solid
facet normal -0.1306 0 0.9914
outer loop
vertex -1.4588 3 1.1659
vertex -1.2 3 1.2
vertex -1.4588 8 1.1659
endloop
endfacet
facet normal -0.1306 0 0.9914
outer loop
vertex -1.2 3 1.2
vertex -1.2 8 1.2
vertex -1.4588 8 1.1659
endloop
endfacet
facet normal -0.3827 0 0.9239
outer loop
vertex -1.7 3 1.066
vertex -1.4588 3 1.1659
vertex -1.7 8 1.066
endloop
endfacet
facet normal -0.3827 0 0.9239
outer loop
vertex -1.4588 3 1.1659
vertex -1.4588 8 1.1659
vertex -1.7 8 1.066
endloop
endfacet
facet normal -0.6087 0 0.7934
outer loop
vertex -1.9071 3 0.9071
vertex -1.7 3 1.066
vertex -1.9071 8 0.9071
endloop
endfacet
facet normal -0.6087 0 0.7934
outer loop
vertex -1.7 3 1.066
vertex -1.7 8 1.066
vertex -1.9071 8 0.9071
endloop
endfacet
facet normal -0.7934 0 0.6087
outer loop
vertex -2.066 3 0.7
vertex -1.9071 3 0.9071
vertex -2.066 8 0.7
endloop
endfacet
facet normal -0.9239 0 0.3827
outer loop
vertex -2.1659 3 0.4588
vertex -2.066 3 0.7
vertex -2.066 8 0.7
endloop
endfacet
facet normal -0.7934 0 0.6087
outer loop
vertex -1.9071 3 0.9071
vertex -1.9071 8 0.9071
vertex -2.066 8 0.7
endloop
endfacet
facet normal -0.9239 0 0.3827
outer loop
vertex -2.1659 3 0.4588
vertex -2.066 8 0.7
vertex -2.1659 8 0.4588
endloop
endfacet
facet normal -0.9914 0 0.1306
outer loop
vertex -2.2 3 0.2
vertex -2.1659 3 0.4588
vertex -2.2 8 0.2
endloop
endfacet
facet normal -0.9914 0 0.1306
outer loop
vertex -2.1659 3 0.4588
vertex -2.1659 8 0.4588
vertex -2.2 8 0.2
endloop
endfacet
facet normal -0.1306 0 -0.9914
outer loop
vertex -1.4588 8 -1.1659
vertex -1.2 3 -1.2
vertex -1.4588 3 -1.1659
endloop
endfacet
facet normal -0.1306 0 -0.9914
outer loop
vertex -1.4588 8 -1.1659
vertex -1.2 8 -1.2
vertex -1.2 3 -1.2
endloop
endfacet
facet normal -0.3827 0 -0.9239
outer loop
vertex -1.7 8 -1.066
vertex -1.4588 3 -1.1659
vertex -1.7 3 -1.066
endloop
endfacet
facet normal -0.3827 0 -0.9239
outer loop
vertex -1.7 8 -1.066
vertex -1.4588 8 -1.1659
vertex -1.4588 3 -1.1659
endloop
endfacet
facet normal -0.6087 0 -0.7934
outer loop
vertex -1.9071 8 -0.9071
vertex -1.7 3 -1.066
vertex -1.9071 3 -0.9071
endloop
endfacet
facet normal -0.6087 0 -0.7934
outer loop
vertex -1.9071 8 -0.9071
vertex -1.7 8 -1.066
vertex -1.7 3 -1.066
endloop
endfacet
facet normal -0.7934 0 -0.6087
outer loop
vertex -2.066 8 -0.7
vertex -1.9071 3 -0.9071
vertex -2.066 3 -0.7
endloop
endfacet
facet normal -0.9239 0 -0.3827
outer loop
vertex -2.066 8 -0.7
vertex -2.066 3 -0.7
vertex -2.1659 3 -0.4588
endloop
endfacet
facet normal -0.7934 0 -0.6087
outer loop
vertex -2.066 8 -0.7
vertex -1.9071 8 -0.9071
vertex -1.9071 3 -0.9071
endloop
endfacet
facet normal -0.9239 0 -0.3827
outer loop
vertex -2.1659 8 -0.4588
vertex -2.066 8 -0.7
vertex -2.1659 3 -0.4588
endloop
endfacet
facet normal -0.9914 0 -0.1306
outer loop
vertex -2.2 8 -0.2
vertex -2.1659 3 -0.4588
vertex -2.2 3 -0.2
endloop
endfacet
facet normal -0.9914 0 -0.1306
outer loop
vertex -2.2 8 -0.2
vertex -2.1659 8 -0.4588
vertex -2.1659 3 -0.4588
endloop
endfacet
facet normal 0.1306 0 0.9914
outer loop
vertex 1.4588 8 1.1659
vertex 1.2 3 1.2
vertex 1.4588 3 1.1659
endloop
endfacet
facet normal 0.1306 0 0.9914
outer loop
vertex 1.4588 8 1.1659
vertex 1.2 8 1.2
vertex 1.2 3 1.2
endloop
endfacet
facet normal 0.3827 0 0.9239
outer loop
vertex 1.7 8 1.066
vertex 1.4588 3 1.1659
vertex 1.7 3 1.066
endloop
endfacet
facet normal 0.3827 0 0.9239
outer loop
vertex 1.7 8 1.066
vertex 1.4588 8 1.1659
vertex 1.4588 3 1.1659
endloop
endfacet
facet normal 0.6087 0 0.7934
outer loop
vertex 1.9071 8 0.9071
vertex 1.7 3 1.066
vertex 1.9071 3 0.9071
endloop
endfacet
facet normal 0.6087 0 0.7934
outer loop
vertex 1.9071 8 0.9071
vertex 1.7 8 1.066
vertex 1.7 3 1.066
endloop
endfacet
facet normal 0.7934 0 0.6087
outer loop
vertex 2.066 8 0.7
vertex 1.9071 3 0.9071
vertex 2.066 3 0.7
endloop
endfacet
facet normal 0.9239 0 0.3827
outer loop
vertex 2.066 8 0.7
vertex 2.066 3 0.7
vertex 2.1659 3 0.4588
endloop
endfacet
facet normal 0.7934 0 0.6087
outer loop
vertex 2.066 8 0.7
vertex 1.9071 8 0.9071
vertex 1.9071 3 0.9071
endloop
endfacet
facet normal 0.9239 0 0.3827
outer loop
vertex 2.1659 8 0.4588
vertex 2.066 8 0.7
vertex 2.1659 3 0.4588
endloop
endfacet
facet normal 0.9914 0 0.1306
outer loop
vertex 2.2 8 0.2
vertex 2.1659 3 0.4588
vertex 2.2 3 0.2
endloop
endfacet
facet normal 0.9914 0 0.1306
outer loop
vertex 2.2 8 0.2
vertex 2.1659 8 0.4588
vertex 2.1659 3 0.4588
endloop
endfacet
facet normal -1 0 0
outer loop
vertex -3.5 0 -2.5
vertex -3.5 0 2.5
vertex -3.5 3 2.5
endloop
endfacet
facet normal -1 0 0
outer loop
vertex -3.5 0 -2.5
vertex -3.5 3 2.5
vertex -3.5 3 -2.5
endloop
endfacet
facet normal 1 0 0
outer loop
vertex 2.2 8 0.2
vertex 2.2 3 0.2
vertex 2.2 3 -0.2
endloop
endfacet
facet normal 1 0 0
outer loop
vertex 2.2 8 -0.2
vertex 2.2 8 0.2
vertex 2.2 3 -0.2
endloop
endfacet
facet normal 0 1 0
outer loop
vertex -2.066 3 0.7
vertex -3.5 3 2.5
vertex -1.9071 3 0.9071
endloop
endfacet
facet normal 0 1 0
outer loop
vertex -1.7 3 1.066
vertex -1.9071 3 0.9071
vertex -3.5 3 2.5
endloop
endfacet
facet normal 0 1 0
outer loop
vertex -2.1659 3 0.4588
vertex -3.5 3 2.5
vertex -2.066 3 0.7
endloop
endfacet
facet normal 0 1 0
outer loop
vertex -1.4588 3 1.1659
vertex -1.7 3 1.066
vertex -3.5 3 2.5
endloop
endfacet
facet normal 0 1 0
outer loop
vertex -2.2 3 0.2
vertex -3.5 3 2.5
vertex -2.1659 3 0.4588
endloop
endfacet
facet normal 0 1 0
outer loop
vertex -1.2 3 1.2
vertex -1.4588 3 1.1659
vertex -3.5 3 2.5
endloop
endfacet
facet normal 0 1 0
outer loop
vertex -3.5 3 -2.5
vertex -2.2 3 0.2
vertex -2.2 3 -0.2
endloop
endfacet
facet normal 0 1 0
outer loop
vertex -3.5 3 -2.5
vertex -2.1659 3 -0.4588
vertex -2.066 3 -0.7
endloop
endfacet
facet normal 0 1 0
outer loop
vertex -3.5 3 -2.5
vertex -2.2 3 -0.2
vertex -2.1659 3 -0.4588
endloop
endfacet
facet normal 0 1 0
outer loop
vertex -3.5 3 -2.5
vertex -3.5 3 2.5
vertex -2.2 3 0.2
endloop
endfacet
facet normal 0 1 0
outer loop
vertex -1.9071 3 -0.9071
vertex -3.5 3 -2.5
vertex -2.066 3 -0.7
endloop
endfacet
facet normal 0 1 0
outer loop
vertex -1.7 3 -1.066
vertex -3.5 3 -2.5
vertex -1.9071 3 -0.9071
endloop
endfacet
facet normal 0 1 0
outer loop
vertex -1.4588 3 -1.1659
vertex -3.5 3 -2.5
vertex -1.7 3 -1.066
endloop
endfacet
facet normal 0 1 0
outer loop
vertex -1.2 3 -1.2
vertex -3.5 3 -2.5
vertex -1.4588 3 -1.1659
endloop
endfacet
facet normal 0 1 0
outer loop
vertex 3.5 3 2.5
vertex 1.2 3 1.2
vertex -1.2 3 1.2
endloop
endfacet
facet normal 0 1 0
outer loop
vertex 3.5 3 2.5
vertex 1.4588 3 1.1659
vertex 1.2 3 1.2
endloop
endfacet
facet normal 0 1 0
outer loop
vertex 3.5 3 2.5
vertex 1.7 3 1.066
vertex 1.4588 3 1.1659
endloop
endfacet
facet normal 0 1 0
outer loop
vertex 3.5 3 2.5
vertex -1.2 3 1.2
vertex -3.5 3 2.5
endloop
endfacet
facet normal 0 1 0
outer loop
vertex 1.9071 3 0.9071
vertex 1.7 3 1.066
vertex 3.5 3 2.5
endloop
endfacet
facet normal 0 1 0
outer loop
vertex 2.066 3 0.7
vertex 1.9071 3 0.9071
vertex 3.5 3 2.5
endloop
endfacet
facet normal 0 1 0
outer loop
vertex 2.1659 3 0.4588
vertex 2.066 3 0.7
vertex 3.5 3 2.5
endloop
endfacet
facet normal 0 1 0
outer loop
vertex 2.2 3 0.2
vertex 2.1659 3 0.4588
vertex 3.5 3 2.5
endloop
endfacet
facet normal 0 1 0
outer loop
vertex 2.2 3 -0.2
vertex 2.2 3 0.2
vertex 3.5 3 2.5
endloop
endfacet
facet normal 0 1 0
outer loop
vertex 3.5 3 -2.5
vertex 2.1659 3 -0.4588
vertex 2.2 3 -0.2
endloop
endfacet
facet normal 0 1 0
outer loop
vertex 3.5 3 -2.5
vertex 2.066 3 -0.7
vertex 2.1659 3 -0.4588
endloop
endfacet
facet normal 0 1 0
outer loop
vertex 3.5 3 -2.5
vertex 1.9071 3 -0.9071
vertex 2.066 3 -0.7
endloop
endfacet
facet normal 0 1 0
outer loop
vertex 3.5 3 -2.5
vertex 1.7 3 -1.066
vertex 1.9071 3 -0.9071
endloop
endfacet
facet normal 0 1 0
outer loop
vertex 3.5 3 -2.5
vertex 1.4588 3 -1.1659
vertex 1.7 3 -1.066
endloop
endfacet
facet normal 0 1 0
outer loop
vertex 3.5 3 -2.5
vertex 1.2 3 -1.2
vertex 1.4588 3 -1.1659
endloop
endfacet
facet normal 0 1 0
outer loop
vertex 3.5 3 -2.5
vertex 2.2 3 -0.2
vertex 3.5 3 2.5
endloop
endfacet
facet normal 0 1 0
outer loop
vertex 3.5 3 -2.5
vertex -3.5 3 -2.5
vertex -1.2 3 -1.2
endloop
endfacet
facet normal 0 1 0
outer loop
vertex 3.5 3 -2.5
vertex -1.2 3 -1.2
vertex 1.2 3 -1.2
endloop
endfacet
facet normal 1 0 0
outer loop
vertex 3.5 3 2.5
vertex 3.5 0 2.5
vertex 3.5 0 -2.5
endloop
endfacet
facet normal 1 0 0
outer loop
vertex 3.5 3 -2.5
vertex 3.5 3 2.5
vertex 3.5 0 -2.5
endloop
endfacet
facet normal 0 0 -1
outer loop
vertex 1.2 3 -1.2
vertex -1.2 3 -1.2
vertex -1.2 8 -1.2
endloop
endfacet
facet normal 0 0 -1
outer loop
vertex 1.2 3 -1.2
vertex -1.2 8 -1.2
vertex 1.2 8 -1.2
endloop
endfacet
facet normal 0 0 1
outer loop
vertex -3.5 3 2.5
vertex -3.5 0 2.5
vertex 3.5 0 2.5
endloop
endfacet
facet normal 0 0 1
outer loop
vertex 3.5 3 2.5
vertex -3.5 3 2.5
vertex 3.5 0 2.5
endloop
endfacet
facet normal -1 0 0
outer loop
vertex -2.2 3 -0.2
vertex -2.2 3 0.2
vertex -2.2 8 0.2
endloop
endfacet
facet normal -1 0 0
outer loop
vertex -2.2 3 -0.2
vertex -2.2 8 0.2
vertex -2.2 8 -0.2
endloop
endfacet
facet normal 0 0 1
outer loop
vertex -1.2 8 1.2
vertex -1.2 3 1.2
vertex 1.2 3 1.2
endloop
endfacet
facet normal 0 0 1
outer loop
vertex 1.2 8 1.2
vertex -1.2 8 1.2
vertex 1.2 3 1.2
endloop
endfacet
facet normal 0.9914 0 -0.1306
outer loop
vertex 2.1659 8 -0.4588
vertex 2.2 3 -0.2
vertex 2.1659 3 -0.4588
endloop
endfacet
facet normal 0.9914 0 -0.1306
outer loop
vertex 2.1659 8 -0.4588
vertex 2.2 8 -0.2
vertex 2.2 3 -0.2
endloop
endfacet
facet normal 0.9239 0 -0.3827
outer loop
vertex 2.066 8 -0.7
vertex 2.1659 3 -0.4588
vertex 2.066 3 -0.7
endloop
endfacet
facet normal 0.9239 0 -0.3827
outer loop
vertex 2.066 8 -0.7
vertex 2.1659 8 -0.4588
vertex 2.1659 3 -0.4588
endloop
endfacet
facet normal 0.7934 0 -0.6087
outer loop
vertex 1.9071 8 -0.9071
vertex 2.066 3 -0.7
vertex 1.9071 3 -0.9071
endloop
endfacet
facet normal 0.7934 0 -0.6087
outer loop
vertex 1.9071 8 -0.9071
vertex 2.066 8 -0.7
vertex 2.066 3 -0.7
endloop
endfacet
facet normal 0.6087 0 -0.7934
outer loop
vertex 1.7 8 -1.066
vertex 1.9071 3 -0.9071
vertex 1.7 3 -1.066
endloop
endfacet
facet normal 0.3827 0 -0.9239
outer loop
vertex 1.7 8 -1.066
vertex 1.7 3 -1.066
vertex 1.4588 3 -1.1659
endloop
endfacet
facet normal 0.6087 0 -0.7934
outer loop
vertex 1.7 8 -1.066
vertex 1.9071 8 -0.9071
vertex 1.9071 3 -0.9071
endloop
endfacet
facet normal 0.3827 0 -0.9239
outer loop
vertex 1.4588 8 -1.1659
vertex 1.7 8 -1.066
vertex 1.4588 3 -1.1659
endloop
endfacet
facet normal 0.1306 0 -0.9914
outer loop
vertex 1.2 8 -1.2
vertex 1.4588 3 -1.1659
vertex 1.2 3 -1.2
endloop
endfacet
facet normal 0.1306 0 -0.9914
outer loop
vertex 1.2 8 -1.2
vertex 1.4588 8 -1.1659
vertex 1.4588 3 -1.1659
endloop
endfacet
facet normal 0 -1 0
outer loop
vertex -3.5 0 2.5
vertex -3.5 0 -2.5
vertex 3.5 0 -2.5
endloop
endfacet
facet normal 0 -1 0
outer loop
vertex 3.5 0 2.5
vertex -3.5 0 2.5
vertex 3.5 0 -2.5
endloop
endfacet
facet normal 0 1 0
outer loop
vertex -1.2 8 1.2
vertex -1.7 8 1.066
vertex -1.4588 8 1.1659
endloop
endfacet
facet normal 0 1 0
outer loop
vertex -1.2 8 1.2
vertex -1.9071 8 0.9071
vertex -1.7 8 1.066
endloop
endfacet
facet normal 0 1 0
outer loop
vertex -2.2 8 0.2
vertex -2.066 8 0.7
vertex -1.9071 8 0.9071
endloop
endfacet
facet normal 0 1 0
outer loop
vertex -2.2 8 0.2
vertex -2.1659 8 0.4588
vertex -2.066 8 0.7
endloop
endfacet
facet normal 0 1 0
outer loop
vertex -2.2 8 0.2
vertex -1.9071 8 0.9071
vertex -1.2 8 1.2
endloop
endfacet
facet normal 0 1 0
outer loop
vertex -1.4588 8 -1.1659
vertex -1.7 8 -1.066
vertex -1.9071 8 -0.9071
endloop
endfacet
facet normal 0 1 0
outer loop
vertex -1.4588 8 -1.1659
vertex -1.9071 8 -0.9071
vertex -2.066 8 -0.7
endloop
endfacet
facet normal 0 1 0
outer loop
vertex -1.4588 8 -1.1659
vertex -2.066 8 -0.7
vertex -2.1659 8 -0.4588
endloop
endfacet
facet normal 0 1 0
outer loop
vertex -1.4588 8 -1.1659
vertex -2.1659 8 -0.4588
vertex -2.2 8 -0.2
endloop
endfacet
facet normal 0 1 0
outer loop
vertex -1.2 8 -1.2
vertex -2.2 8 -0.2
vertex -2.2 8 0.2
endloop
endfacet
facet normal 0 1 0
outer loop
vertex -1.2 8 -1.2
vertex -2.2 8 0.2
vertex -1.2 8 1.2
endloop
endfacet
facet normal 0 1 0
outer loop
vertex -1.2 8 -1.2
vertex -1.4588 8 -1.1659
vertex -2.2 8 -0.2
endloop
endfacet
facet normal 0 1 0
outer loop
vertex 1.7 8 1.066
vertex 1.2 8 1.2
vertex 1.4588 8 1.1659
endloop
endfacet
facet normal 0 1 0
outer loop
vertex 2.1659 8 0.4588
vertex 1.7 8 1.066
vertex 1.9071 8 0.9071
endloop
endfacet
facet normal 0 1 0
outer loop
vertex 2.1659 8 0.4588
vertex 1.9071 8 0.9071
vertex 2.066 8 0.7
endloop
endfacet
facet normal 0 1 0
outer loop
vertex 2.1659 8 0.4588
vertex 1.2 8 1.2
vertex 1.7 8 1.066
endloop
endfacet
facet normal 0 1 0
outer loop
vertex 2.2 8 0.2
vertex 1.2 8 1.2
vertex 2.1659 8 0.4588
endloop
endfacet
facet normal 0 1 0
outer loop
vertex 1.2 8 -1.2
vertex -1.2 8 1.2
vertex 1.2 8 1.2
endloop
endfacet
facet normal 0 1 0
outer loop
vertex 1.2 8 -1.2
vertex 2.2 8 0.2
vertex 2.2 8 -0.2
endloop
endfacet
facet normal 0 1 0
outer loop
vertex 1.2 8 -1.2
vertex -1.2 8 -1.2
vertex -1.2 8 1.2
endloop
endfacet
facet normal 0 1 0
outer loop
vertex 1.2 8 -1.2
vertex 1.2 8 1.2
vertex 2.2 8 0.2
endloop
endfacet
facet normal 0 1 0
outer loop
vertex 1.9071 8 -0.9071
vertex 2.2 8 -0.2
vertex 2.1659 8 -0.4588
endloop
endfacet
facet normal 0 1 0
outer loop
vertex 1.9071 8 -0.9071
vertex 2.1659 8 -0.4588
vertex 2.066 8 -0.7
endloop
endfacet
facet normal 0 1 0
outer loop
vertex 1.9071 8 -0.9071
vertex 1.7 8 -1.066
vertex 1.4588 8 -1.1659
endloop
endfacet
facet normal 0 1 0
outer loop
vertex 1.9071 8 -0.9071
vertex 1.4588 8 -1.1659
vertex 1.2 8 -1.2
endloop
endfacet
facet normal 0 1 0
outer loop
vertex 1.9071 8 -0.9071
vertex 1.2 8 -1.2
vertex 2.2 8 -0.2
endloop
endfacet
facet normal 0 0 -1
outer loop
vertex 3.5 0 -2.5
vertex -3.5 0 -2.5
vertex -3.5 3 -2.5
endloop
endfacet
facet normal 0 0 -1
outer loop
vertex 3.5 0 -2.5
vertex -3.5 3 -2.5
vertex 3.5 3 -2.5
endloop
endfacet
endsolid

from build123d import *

# Parameters (mm, degrees)
SKETCH1_W           = 7
SKETCH1_H           = 5
BOSS_EXTRUDE1_DEPTH = 3
SKETCH2_W           = 4.4
SKETCH2_H           = 2.4
BOSS_EXTRUDE2_DEPTH = 5
FILLET1_R           = 1


with BuildPart() as part:
    # Sketch1 → Boss-Extrude1 (new body)
    with BuildSketch(Plane(origin=(0, 0, 0), x_dir=(1, 0, 0), z_dir=(0, 1, 0))):
        Rectangle(SKETCH1_W, SKETCH1_H)
    extrude(amount=BOSS_EXTRUDE1_DEPTH)

    # Sketch2 → Boss-Extrude2 (add)
    with BuildSketch(Plane(origin=(0, 3, 0), x_dir=(1, 0, 0), z_dir=(0, 1, 0))):
        Rectangle(SKETCH2_W, SKETCH2_H)
    extrude(amount=BOSS_EXTRUDE2_DEPTH)

    # Fillet1
    fillet1_edges = [part.edges().sort_by_distance(p)[0] for p in [
        (2.2, 5.5, 1.2),
        (2.2, 5.5, -1.2),
        (-2.2, 5.5, -1.2),
        (-2.2, 5.5, 1.2),
    ]]
    fillet(fillet1_edges, radius=FILLET1_R)


solid = part.part
